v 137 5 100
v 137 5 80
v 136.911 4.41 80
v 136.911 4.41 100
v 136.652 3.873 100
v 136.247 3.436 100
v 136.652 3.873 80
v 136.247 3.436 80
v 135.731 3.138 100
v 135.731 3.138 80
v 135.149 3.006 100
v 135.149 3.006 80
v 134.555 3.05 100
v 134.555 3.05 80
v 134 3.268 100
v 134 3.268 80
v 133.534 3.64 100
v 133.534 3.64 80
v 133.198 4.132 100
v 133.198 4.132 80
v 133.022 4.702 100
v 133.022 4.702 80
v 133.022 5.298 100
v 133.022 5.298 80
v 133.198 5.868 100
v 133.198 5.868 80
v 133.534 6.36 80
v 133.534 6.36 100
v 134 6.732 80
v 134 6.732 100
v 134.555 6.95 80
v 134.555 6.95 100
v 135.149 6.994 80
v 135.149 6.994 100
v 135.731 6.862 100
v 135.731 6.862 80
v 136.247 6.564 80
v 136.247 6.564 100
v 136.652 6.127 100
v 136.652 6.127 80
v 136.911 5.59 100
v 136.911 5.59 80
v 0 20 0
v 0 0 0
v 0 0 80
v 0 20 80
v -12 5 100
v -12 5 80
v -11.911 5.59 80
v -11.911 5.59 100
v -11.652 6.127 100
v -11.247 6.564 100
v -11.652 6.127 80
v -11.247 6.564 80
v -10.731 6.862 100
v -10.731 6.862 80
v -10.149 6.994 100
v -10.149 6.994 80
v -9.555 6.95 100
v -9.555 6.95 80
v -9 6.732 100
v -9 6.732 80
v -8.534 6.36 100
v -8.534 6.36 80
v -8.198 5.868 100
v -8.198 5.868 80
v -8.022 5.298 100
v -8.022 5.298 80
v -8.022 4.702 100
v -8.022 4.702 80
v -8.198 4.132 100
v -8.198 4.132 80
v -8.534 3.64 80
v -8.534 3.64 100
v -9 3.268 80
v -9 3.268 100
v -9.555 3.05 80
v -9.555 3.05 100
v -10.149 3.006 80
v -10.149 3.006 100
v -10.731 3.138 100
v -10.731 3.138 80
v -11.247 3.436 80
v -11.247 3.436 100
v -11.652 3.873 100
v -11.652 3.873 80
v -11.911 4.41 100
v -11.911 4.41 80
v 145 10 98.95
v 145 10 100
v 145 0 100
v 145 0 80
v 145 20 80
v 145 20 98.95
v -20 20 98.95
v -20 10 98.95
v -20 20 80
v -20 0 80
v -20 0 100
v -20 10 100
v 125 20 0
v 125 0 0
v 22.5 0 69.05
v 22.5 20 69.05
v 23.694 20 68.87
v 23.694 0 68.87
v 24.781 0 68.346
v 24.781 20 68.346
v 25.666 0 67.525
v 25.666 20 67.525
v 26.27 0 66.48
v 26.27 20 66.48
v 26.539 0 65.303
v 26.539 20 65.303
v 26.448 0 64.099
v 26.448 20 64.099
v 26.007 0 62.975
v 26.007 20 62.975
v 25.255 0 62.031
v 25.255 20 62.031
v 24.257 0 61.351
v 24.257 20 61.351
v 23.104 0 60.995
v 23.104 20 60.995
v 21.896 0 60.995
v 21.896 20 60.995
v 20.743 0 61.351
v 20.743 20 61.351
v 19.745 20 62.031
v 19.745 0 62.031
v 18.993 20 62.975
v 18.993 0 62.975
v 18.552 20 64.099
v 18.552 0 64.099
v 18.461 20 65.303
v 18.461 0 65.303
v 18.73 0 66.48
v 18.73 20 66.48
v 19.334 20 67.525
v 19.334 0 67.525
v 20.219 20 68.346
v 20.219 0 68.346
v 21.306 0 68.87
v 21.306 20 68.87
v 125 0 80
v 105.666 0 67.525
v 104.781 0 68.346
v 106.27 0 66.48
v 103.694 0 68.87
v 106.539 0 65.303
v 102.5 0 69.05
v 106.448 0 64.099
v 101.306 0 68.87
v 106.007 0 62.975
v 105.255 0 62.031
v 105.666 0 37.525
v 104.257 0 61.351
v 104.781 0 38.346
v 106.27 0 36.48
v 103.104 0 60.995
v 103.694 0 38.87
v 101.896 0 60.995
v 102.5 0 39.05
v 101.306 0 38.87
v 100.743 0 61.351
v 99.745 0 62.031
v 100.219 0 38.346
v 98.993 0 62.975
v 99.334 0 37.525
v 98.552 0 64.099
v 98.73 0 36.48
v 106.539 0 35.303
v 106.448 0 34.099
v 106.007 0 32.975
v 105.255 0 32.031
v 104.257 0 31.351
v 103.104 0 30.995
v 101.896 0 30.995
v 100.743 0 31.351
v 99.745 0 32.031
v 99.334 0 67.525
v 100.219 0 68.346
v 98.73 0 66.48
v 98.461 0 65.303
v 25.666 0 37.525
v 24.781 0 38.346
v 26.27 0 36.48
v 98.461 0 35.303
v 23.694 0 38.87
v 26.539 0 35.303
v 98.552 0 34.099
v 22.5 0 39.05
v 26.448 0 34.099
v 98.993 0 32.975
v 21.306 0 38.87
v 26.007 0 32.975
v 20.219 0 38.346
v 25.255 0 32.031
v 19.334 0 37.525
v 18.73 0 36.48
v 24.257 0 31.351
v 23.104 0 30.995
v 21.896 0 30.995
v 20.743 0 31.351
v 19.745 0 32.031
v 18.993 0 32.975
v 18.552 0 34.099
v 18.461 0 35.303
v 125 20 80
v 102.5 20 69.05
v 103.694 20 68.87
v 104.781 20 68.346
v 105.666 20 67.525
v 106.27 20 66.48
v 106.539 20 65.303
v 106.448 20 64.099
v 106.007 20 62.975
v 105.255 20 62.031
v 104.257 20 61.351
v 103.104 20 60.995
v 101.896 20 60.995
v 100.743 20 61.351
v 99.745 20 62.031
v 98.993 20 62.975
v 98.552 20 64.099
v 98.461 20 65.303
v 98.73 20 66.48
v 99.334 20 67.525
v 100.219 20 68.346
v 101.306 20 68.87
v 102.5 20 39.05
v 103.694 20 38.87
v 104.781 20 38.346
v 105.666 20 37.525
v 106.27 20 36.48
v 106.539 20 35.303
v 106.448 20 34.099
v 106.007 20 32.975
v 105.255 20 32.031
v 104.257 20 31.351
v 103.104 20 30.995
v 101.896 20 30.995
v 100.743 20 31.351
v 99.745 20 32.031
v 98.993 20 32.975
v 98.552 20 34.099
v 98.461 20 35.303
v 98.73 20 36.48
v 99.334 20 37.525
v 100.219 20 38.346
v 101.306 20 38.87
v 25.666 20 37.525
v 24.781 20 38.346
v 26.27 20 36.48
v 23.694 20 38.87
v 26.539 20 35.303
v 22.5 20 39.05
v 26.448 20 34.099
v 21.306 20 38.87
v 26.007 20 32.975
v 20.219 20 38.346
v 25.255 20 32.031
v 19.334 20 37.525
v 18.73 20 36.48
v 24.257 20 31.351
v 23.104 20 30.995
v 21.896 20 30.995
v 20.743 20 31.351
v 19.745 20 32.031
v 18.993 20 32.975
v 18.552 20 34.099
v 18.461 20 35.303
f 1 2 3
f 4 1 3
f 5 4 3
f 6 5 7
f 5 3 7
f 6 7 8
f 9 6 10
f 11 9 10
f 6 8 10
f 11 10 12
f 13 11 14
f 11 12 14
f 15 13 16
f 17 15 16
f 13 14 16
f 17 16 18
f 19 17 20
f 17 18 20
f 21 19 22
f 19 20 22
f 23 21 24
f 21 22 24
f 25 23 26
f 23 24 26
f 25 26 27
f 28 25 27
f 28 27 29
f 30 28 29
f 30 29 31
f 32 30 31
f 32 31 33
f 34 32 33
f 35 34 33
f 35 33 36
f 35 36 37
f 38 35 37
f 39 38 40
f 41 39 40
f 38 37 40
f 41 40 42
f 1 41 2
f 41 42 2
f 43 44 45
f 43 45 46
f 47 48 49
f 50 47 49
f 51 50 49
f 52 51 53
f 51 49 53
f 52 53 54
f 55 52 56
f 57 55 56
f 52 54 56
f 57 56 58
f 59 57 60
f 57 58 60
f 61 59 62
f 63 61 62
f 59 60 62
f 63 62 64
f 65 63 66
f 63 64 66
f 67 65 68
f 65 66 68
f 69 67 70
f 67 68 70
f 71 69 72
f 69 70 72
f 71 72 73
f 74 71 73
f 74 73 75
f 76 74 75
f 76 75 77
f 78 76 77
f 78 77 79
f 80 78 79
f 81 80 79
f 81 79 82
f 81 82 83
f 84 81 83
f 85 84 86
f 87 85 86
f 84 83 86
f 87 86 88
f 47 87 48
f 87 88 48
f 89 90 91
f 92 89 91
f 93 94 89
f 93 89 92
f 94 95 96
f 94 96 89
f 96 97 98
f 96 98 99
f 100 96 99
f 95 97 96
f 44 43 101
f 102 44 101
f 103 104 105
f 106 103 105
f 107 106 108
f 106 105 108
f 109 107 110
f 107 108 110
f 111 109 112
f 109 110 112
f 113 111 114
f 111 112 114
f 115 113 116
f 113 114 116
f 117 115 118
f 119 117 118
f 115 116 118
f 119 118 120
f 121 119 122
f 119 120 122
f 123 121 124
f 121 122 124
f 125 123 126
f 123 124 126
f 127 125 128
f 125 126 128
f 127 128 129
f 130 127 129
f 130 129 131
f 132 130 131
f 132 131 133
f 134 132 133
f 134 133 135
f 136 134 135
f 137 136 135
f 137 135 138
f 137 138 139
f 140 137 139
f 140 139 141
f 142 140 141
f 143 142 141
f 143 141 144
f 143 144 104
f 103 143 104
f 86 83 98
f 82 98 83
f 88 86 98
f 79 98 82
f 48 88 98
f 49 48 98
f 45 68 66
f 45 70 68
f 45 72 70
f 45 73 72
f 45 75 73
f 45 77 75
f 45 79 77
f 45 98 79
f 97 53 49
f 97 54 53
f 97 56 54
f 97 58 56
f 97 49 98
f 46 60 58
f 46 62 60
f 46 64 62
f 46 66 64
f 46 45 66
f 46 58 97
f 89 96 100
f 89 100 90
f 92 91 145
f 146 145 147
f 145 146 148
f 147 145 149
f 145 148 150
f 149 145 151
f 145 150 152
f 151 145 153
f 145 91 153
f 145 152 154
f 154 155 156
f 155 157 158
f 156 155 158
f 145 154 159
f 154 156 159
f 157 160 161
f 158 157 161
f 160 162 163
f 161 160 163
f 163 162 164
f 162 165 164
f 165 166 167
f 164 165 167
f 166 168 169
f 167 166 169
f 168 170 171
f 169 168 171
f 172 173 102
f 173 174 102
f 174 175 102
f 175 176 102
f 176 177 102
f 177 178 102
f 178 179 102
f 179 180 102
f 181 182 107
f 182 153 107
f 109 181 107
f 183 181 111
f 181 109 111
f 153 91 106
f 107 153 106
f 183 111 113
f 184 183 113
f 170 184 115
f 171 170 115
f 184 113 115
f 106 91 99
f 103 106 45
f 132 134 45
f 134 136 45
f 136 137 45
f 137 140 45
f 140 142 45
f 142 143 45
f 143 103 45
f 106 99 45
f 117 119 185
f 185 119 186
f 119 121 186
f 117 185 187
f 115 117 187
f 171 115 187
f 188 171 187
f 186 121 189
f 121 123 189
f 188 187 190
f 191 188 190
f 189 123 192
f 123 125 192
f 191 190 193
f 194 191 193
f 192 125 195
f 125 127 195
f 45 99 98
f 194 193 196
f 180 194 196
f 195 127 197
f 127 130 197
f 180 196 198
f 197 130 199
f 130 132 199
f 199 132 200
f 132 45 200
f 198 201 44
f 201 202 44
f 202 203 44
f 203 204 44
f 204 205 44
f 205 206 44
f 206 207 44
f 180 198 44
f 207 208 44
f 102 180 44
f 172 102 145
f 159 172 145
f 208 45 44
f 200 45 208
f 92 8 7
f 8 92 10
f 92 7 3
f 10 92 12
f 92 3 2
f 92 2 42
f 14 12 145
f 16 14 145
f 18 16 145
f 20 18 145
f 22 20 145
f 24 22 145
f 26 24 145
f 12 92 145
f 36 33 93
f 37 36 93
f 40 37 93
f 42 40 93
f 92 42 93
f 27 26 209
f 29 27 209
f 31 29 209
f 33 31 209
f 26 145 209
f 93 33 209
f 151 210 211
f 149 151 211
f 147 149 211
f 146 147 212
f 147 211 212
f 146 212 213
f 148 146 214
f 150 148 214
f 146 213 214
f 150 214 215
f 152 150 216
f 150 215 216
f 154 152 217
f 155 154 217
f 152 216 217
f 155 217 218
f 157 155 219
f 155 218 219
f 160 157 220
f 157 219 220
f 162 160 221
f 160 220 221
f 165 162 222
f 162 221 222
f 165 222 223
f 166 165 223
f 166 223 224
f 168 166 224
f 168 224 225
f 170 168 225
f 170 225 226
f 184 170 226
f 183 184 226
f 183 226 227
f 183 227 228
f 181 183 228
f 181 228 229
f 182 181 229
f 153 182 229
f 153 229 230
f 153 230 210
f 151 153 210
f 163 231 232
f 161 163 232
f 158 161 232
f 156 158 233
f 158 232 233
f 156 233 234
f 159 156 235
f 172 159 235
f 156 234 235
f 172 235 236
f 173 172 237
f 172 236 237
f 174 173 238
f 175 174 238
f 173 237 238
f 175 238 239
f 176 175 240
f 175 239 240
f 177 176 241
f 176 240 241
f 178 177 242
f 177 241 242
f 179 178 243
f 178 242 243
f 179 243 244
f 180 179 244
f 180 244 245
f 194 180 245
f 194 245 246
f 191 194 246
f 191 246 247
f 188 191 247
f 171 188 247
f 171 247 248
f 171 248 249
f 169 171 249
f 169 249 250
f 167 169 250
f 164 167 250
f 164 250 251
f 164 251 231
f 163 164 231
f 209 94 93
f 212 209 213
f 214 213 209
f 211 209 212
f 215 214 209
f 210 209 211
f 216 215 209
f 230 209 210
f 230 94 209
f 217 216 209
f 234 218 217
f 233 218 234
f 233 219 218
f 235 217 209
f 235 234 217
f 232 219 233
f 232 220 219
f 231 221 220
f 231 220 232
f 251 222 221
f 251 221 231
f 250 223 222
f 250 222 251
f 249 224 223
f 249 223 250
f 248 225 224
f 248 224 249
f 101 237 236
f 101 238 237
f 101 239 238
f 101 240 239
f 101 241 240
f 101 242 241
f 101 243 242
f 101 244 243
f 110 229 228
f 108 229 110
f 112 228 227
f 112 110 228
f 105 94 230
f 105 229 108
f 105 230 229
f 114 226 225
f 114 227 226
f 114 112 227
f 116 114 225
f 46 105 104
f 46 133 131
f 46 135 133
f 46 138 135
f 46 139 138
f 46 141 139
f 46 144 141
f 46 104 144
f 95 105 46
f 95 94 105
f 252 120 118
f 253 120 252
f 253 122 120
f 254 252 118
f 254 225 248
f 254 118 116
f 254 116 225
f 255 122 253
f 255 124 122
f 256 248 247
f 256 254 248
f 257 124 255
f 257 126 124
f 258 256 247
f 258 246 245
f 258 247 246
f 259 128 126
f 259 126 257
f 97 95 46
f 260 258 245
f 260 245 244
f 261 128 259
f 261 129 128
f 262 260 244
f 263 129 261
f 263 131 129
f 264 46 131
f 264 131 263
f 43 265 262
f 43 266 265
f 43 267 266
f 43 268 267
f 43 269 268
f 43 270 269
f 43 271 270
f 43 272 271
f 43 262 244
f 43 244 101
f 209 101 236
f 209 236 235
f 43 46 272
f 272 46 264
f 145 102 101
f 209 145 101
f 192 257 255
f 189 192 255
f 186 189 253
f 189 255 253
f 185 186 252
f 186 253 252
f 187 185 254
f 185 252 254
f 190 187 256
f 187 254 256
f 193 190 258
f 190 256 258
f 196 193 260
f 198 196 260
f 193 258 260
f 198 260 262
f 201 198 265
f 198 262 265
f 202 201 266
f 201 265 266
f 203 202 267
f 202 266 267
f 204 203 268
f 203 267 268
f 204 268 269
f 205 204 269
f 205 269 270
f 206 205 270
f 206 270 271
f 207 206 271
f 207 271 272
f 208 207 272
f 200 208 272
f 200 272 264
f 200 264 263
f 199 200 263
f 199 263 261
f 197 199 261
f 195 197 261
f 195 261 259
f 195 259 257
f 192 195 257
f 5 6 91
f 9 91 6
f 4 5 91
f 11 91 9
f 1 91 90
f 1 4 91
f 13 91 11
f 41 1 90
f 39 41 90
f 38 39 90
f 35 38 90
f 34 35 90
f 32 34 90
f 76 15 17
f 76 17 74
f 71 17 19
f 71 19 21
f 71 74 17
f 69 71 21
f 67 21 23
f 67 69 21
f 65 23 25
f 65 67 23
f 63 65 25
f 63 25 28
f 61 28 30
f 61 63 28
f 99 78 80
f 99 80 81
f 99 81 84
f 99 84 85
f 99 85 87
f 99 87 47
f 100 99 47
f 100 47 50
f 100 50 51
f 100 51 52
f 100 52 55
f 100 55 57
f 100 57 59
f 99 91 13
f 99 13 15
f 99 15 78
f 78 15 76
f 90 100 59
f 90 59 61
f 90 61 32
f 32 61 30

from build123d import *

# Parameters (mm, degrees)
SKETCH1_W               = 125
SKETCH1_H               = 20
BOSS_EXTRUDE1_DEPTH     = 100
SKETCH8_W               = 20
SKETCH8_H               = 20
BOSS_EXTRUDE2_DEPTH     = 20
SKETCH11_R              = 4.05
CUT_EXTRUDE3_DEPTH      = 40
SKETCH9_W               = 20
SKETCH9_H               = 20
BOSS_EXTRUDE3_DEPTH     = 20
SKETCH10_R              = 2
CUT_EXTRUDE2_DEPTH      = 20
ESQUISSE2_W             = 165
ESQUISSE2_H             = 1.05
ENL_V_MAT_EXTRU_1_DEPTH = 10


with BuildPart() as part:
    # Sketch1 → Boss-Extrude1 (new body)
    with BuildSketch(Plane.XY):
        with Locations((62.5, 10)):
            Rectangle(SKETCH1_W, SKETCH1_H)
    extrude(amount=BOSS_EXTRUDE1_DEPTH)

    # Sketch8 → Boss-Extrude2 (add)
    with BuildSketch(Plane.ZY):
        with Locations((90, 10)):
            Rectangle(SKETCH8_W, SKETCH8_H)
    extrude(amount=BOSS_EXTRUDE2_DEPTH)

    # Sketch11 → Cut-Extrude3 (cut)
    with BuildSketch(Plane(origin=(0, 20, 0), x_dir=(1, 0, 0), z_dir=(0, 1, 0))):
        with Locations(Location((22.5, -35, 0), (0, 0, 270))):
            Circle(SKETCH11_R)
        with Locations(Location((22.5, -65, 0), (0, 0, 270))):
            Circle(SKETCH11_R)
        with Locations(Location((102.5, -65, 0), (0, 0, 270))):
            Circle(SKETCH11_R)
        with Locations(Location((102.5, -35, 0), (0, 0, 270))):
            Circle(SKETCH11_R)
    extrude(amount=-CUT_EXTRUDE3_DEPTH, mode=Mode.SUBTRACT)

    # Sketch9 → Boss-Extrude3 (add)
    with BuildSketch(Plane(origin=(125, 0, 0), x_dir=(0, 0, -1), z_dir=(1, 0, 0))):
        with Locations((-90, 10)):
            Rectangle(SKETCH9_W, SKETCH9_H)
    extrude(amount=BOSS_EXTRUDE3_DEPTH)

    # Sketch10 → Cut-Extrude2 (cut)
    with BuildSketch(Plane(origin=(0, 0, 80), x_dir=(-1, 0, 0), z_dir=(0, 0, -1))):
        with Locations((10, 5)):
            Circle(SKETCH10_R)
        with Locations(Location((-135, 5, 0), (0, 0, 180))):
            Circle(SKETCH10_R)
    extrude(amount=-CUT_EXTRUDE2_DEPTH, mode=Mode.SUBTRACT)

    # Esquisse2 → Enlèv. mat.-Extru.1 (cut)
    with BuildSketch(Plane(origin=(0, 20, 0), x_dir=(1, 0, 0), z_dir=(0, 1, 0))):
        with Locations((62.5, -99.475)):
            Rectangle(ESQUISSE2_W, ESQUISSE2_H)
    extrude(amount=-ENL_V_MAT_EXTRU_1_DEPTH, mode=Mode.SUBTRACT)


solid = part.part
